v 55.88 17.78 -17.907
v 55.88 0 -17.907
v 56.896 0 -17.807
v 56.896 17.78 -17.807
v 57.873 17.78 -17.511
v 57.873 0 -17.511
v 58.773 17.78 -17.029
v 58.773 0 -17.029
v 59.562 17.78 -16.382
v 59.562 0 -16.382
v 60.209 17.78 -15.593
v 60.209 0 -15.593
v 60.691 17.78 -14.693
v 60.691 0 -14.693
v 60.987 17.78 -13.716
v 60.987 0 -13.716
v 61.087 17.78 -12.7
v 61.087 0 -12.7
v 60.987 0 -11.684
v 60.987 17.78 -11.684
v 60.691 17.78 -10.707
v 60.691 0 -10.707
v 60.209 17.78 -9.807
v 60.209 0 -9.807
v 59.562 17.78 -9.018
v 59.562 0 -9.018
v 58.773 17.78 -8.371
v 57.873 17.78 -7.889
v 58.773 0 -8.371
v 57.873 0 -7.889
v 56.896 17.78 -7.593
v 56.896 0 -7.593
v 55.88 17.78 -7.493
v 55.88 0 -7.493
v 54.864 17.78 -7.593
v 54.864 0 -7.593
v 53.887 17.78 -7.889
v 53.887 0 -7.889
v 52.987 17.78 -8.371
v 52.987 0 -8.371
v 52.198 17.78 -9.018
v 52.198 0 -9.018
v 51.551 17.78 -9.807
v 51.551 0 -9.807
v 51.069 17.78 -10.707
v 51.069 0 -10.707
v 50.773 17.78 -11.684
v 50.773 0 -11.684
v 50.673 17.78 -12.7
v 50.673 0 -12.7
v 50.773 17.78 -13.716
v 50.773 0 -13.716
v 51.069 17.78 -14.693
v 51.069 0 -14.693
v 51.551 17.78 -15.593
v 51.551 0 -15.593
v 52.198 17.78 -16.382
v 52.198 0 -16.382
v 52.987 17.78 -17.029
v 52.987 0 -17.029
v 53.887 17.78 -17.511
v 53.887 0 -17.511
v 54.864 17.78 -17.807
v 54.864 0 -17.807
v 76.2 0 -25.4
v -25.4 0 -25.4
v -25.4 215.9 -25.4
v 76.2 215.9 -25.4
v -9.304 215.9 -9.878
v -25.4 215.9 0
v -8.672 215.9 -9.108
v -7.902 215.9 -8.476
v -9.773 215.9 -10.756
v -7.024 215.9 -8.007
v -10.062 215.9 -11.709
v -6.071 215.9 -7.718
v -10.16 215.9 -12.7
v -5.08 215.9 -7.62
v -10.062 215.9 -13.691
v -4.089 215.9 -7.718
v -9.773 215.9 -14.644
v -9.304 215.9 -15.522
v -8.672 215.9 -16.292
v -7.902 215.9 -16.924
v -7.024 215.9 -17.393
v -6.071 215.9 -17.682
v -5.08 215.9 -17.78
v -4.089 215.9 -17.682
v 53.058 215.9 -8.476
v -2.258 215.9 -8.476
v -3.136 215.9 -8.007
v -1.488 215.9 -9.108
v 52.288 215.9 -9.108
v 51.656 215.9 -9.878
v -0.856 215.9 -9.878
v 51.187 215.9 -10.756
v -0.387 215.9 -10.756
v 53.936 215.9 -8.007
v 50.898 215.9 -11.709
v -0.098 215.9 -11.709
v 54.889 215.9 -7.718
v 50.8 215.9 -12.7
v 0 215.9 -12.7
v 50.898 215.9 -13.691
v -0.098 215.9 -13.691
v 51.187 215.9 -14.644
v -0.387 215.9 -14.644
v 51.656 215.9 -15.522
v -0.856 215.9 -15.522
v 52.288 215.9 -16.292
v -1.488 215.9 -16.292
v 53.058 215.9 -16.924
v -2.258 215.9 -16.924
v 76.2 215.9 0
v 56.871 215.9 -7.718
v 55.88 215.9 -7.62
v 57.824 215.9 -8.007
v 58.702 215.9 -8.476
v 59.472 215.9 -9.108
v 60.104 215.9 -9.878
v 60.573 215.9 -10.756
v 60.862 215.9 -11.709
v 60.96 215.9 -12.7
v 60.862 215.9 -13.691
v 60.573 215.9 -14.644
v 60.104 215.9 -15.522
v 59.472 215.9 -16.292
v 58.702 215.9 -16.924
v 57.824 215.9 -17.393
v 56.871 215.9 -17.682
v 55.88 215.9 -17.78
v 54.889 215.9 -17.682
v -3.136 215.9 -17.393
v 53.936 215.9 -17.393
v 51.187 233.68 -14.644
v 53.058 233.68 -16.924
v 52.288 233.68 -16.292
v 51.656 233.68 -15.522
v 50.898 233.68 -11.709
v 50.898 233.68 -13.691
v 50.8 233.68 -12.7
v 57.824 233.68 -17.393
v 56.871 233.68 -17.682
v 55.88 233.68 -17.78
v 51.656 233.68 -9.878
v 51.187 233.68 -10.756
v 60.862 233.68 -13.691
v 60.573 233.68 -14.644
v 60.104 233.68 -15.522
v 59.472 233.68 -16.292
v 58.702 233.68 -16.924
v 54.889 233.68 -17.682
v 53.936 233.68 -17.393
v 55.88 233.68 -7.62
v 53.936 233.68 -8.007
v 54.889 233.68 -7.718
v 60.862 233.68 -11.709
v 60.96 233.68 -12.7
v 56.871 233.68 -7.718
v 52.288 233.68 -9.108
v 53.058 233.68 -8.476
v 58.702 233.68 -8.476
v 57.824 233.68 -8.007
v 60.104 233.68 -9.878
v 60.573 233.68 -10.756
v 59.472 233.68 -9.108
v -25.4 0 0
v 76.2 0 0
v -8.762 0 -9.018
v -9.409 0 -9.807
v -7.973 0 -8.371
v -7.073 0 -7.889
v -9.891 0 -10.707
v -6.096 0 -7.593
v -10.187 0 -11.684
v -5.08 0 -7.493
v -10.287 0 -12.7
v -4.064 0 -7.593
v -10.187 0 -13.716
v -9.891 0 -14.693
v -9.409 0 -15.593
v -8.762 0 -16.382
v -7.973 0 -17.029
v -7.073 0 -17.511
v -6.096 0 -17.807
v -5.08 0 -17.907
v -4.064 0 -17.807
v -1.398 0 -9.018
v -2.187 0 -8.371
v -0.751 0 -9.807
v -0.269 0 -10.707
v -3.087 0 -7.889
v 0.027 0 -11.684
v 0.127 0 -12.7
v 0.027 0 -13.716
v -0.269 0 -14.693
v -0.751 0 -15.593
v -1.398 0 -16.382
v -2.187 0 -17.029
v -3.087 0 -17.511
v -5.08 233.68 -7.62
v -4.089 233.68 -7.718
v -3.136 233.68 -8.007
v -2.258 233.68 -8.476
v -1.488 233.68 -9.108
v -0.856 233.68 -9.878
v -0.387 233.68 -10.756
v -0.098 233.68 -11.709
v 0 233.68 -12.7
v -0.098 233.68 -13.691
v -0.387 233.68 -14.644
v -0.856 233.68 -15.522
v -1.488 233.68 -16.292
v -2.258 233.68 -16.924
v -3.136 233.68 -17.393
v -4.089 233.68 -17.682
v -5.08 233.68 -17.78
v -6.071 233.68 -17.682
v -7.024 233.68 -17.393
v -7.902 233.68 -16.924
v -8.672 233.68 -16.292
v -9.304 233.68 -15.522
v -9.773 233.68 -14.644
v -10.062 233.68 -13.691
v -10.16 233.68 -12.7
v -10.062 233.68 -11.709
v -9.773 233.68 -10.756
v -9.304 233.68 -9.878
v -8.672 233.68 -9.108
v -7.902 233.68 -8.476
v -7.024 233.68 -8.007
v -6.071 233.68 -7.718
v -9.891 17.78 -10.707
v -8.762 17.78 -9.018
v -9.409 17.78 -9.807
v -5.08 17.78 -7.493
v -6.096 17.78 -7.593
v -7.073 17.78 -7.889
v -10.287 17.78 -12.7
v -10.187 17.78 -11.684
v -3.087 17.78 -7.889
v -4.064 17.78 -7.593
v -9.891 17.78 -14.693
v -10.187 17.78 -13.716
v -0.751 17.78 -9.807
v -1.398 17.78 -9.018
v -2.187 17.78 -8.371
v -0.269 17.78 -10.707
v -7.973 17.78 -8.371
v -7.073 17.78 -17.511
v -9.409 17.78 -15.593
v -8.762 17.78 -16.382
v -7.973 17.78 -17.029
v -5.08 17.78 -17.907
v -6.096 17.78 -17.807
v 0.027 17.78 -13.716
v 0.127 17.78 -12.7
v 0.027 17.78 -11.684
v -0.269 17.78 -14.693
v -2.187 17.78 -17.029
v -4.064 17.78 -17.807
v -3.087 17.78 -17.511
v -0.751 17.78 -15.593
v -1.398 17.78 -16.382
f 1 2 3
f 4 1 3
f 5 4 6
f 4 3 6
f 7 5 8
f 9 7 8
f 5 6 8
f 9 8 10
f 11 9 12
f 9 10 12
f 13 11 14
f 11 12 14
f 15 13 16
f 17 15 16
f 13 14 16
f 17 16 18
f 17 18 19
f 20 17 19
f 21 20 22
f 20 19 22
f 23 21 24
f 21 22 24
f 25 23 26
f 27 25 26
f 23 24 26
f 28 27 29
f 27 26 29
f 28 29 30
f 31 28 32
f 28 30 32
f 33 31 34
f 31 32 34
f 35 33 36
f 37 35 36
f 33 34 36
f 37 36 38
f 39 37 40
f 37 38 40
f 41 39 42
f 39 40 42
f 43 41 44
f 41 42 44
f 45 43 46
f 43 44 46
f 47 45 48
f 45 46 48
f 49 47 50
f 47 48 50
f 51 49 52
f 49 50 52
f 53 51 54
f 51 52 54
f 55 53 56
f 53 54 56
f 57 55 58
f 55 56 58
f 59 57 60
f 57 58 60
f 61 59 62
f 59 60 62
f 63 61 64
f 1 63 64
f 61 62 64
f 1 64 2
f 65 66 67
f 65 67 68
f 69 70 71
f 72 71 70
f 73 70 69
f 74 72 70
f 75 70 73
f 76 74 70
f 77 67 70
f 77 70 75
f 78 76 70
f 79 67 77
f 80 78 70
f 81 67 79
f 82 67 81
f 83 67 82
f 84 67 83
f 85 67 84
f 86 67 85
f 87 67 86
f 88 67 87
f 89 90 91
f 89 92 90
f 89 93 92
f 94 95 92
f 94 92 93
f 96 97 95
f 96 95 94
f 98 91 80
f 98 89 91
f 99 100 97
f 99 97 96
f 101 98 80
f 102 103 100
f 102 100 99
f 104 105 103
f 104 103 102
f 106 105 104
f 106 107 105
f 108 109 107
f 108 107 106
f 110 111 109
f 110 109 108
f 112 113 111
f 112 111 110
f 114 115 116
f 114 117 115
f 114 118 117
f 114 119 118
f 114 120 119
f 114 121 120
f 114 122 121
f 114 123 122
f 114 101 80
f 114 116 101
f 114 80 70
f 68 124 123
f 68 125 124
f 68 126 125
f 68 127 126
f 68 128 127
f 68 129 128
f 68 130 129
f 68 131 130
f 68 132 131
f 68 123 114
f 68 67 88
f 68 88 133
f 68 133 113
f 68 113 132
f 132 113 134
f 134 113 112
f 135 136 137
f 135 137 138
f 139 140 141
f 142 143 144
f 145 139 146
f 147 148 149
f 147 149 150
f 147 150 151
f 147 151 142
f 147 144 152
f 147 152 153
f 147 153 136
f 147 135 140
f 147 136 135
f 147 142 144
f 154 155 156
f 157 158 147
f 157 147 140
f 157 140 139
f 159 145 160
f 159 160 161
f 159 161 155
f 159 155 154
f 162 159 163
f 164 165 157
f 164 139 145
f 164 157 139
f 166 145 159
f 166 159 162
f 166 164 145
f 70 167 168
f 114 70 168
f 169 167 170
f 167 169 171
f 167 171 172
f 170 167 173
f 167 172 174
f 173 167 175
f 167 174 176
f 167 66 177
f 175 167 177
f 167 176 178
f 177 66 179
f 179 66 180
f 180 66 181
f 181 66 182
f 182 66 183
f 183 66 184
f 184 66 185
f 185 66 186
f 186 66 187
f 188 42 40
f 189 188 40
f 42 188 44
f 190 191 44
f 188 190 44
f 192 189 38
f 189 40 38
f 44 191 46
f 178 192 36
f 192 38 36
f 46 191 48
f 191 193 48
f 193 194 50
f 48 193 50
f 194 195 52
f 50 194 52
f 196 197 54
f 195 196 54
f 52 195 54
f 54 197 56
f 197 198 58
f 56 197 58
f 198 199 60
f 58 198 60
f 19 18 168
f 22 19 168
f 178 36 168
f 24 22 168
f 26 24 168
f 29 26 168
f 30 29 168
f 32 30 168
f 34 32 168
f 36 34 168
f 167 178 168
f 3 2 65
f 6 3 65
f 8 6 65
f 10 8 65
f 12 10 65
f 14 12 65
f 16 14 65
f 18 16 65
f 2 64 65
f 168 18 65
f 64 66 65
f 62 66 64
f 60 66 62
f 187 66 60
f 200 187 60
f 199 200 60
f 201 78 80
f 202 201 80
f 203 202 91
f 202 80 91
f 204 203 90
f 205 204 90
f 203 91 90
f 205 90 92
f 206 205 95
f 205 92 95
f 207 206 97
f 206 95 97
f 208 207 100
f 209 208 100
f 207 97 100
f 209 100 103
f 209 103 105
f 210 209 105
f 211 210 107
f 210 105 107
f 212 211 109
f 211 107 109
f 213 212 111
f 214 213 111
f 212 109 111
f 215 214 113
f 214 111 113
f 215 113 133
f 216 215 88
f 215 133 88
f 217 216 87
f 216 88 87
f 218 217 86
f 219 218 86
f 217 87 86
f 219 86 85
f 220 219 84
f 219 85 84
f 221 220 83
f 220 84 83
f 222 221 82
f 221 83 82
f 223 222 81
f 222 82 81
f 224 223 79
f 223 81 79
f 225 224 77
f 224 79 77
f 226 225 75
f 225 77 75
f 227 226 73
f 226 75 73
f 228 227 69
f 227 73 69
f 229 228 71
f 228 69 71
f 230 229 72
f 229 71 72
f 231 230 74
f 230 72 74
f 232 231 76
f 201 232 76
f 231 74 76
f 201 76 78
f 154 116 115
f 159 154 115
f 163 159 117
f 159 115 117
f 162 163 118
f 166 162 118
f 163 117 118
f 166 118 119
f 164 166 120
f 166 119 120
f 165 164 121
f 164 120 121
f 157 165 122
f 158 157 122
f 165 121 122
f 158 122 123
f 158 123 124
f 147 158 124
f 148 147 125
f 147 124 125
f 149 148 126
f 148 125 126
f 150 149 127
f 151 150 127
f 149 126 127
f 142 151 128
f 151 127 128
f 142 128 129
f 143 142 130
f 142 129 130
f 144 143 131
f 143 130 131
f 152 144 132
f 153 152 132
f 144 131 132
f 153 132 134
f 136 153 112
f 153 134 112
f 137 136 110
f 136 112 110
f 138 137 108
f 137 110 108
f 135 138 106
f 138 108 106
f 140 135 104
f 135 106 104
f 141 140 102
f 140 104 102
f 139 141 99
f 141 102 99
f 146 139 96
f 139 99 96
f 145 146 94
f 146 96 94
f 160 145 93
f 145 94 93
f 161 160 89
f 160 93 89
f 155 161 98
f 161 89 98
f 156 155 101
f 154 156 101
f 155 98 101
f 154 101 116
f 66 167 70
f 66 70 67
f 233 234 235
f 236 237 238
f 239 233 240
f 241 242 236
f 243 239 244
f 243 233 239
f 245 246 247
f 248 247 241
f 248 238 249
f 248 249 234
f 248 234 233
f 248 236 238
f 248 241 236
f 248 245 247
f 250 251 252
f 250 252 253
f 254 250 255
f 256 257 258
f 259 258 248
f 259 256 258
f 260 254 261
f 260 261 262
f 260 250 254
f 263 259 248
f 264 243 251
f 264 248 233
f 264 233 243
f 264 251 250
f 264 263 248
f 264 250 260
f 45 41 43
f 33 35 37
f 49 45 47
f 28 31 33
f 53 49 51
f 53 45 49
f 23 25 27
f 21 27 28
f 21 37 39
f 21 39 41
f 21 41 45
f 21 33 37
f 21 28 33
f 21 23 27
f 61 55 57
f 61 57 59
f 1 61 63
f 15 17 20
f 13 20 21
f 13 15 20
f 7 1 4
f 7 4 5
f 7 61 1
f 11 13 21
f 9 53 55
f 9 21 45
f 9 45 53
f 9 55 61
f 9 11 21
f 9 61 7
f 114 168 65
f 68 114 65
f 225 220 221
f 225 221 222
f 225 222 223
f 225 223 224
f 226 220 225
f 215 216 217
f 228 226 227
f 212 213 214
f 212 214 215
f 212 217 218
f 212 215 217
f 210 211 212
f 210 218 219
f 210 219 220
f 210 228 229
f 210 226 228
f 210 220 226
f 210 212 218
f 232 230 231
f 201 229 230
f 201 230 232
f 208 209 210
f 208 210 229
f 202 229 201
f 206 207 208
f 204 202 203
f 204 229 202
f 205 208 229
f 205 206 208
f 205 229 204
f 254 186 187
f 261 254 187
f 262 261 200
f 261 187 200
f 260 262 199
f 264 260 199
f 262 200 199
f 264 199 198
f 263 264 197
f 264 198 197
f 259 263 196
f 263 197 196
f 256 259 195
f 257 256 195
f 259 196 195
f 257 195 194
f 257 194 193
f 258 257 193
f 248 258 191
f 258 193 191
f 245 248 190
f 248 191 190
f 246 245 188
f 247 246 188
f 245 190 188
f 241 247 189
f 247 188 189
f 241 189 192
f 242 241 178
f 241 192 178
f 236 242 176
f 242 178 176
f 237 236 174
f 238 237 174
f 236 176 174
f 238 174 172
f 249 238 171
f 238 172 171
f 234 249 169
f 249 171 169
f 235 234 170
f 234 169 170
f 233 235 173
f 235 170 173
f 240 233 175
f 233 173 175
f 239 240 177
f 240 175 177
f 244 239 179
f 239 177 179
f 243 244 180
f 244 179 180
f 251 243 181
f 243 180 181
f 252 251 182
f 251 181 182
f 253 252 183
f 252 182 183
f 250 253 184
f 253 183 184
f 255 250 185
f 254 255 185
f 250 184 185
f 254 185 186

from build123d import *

# Parameters (mm, degrees)
SKETCH1_W           = 101.6
SKETCH1_H           = 25.4
BOSS_EXTRUDE1_DEPTH = 215.9
SKETCH3_R           = 5.207
CUT_EXTRUDE1_DEPTH  = 17.78
SKETCH4_R           = 5.08
BOSS_EXTRUDE3_DEPTH = 17.78


with BuildPart() as part:
    # Sketch1 → Boss-Extrude1 (new body)
    with BuildSketch(Plane(origin=(0, 0, 0), x_dir=(1, 0, 0), z_dir=(0, 1, 0))):
        with Locations((25.4, 12.7)):
            Rectangle(SKETCH1_W, SKETCH1_H)
    extrude(amount=BOSS_EXTRUDE1_DEPTH)

    # Sketch3 → Cut-Extrude1 (cut)
    with BuildSketch(Plane(origin=(0, 0, 0), x_dir=(-1, 0, 0), z_dir=(0, -1, 0))):
        with Locations(Location((5.08, 12.7, 0), (0, 0, 90))):
            Circle(SKETCH3_R)
        with Locations(Location((-55.88, 12.7, 0), (0, 0, 90))):
            Circle(SKETCH3_R)
    extrude(amount=-CUT_EXTRUDE1_DEPTH, mode=Mode.SUBTRACT)

    # Sketch4 → Boss-Extrude3 (add)
    with BuildSketch(Plane(origin=(0, 215.9, 0), x_dir=(1, 0, 0), z_dir=(0, 1, 0))):
        with Locations(Location((-5.08, 12.7, 0), (0, 0, 270))):
            Circle(SKETCH4_R)
        with Locations(Location((55.88, 12.7, 0), (0, 0, 270))):
            Circle(SKETCH4_R)
    extrude(amount=BOSS_EXTRUDE3_DEPTH)


solid = part.part
